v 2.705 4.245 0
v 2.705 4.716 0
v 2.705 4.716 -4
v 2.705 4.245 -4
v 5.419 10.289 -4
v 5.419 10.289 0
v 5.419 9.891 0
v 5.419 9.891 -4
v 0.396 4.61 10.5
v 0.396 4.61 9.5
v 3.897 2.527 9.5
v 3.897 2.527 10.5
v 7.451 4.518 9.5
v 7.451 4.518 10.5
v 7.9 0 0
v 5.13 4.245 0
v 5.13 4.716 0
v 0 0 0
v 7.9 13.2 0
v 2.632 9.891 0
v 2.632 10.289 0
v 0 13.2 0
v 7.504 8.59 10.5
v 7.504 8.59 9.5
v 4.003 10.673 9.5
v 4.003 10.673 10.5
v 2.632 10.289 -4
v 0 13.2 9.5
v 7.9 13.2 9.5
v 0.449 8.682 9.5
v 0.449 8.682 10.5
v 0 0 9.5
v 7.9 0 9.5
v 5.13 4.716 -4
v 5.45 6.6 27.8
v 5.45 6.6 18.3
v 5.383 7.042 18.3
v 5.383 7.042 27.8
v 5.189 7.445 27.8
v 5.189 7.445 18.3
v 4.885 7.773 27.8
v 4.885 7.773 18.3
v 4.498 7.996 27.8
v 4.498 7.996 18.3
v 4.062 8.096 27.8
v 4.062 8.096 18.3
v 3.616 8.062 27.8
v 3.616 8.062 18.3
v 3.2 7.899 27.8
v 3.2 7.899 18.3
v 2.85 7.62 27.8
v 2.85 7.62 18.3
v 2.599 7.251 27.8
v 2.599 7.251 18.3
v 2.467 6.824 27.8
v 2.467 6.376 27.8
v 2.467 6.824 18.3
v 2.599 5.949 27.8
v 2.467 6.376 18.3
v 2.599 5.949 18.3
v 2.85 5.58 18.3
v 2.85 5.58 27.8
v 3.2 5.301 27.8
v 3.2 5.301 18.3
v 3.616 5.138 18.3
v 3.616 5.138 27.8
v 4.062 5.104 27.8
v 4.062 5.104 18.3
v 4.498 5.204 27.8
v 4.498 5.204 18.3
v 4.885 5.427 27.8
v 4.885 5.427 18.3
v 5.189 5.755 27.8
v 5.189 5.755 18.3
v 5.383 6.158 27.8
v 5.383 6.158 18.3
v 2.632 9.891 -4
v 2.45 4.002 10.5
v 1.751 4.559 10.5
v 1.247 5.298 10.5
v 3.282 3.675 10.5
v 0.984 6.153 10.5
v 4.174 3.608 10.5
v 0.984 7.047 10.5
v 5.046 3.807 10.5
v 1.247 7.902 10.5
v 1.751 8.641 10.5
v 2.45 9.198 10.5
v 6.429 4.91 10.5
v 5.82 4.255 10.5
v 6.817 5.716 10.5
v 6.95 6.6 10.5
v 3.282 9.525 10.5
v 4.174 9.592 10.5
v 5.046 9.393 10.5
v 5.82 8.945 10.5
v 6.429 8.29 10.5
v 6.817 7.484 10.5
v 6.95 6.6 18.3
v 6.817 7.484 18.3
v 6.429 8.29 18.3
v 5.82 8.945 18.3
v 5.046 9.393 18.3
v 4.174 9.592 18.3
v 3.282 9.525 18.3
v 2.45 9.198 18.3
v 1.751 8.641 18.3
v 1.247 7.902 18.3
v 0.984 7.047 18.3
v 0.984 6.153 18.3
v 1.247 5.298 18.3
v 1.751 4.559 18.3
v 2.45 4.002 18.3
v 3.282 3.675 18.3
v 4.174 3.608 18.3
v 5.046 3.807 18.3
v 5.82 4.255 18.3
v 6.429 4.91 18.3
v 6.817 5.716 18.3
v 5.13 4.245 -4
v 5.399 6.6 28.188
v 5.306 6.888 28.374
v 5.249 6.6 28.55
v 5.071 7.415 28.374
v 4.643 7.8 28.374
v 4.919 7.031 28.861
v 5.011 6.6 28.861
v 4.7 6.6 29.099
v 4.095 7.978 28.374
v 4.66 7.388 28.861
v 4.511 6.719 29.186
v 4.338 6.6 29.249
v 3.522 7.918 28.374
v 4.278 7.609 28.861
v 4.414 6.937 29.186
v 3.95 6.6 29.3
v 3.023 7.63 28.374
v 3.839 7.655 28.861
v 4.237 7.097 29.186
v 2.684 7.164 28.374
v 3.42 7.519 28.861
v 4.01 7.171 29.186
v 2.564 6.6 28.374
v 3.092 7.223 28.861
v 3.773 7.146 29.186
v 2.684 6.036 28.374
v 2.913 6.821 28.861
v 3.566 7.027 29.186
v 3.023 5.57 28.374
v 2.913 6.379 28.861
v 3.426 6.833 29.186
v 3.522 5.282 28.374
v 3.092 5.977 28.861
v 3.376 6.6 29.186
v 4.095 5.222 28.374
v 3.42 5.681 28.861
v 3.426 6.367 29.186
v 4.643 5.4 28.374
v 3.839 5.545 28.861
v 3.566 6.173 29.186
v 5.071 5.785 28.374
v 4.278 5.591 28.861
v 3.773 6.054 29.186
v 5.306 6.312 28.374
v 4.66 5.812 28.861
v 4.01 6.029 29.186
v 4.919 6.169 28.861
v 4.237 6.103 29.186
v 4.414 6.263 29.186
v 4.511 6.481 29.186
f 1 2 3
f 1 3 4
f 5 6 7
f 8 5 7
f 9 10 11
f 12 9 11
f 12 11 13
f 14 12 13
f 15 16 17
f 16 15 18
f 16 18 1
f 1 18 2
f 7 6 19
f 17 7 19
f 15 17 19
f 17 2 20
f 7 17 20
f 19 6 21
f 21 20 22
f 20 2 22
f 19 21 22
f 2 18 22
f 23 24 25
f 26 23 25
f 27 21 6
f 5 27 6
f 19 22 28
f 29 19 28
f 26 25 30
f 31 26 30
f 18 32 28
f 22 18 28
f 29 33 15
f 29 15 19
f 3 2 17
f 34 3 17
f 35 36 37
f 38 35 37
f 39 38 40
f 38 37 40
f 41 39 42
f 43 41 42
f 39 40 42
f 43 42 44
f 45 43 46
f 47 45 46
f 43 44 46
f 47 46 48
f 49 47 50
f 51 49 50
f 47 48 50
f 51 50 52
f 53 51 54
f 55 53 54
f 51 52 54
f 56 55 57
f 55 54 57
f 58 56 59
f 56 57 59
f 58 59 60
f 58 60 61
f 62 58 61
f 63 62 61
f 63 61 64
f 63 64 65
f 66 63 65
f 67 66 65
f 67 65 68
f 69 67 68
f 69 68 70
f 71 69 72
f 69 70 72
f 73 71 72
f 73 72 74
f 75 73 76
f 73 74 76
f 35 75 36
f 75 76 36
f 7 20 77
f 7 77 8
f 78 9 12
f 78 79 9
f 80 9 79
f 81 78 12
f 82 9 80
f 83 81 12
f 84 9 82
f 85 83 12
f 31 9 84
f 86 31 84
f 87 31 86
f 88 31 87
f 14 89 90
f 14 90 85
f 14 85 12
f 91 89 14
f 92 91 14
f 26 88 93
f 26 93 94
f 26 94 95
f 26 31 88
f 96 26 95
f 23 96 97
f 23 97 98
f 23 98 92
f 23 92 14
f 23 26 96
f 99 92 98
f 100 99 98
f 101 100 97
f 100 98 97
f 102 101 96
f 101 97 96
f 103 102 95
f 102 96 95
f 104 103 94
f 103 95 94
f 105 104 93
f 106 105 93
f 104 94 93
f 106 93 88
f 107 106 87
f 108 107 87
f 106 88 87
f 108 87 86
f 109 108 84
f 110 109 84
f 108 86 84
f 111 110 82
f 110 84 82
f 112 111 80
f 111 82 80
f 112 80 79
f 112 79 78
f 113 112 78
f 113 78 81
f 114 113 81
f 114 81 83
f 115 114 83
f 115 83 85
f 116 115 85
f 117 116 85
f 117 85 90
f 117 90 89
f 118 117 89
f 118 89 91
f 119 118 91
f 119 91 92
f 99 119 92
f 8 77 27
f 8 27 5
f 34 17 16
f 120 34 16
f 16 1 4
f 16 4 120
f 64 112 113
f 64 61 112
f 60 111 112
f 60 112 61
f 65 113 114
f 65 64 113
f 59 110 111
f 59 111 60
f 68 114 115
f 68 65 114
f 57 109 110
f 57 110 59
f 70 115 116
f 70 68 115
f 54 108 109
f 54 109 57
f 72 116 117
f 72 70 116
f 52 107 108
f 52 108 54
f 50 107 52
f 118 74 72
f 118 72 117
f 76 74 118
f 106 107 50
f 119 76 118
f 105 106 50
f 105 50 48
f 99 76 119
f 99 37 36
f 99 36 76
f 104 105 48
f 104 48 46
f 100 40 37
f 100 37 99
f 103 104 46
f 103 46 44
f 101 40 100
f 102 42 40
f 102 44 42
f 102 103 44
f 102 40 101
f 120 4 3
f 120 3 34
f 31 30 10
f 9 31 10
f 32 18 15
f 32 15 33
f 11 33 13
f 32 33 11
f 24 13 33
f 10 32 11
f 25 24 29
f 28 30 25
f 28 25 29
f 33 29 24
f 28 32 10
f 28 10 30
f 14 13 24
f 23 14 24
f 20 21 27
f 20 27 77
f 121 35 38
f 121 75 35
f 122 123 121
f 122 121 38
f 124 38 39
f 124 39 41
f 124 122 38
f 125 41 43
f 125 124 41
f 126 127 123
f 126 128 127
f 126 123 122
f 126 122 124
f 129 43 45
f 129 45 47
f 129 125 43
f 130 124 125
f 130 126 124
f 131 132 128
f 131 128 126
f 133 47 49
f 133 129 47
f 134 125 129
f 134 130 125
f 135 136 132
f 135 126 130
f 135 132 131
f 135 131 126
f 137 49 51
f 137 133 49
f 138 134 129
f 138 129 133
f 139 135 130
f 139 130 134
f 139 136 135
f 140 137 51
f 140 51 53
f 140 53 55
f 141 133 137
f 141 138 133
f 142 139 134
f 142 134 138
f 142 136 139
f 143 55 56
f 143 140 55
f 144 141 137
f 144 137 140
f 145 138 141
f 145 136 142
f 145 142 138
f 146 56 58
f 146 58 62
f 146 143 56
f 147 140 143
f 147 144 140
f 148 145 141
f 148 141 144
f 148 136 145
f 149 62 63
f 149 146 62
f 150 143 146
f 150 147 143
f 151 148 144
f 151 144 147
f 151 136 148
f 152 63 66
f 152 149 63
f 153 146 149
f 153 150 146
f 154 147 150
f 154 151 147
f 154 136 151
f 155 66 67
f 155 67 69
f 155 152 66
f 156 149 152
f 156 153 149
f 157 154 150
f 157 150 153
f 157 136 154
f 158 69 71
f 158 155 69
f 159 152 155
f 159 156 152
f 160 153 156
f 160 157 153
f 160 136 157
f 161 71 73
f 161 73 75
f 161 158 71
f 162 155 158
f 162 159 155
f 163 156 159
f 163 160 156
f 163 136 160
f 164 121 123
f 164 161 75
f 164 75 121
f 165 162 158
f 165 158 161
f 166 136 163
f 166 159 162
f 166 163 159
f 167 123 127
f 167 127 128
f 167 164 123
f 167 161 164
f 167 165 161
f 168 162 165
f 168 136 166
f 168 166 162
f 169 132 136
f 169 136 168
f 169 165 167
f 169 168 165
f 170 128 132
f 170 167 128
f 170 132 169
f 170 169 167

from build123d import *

# Parameters (mm, degrees)
F0_W      = 13.2
F0_H      = 9.5
F1_DEPTH  = 7.9
F2_R      = 3
F3_DEPTH  = 8.8
F4_R      = 1.5
F5_DEPTH  = 11
F6_R      = 1.5
F7_W      = 2.424983
F7_H      = 0.470519
F7_W_2    = 2.78692
F7_H_2    = 0.398131
F8_DEPTH  = 4
F10_DEPTH = 1


with BuildPart() as f1:
    # F0 (on Right) → F1 (new body)
    with BuildSketch(Plane.YZ):
        with Locations((6.6, 4.75)):
            Rectangle(F0_W, F0_H)
    extrude(amount=F1_DEPTH)

    # F2 (on face) → F3 (join)
    with BuildSketch(Plane.XY.offset(9.5)):
        with Locations((3.95, 6.6)):
            Circle(F2_R)
    extrude(amount=F3_DEPTH)

    # F4 (on face) → F5 (join)
    with BuildSketch(Plane.XY.offset(18.3)):
        with Locations((3.95, 6.6)):
            Circle(F4_R)
    extrude(amount=F5_DEPTH)

    # F6
    f6_edges = [f1.edges().sort_by_distance(p)[0] for p in [
        (2.45, 6.6, 29.3),
    ]]
    fillet(f6_edges, radius=F6_R)

    # F7 (on face) → F8 (join)
    with BuildSketch(Plane(origin=(0, 0, 0), x_dir=(1, 0, 0), z_dir=(0, 0, -1))):
        with Locations((3.917066, -4.48028)):
            Rectangle(F7_W, F7_H)
        with Locations((4.025647, -10.090314)):
            Rectangle(F7_W_2, F7_H_2)
    extrude(amount=F8_DEPTH)

    # F9 (on face) → F10 (join)
    with BuildSketch(Plane.XY.offset(9.5)):
        Polygon((3.896882, 2.52701), (7.450754, 4.517503), (7.503872, 8.590493), (4.003118, 10.67299), (0.449246, 8.682497), (0.396128, 4.609507), align=None)
    extrude(amount=F10_DEPTH)


solid = f1.part
